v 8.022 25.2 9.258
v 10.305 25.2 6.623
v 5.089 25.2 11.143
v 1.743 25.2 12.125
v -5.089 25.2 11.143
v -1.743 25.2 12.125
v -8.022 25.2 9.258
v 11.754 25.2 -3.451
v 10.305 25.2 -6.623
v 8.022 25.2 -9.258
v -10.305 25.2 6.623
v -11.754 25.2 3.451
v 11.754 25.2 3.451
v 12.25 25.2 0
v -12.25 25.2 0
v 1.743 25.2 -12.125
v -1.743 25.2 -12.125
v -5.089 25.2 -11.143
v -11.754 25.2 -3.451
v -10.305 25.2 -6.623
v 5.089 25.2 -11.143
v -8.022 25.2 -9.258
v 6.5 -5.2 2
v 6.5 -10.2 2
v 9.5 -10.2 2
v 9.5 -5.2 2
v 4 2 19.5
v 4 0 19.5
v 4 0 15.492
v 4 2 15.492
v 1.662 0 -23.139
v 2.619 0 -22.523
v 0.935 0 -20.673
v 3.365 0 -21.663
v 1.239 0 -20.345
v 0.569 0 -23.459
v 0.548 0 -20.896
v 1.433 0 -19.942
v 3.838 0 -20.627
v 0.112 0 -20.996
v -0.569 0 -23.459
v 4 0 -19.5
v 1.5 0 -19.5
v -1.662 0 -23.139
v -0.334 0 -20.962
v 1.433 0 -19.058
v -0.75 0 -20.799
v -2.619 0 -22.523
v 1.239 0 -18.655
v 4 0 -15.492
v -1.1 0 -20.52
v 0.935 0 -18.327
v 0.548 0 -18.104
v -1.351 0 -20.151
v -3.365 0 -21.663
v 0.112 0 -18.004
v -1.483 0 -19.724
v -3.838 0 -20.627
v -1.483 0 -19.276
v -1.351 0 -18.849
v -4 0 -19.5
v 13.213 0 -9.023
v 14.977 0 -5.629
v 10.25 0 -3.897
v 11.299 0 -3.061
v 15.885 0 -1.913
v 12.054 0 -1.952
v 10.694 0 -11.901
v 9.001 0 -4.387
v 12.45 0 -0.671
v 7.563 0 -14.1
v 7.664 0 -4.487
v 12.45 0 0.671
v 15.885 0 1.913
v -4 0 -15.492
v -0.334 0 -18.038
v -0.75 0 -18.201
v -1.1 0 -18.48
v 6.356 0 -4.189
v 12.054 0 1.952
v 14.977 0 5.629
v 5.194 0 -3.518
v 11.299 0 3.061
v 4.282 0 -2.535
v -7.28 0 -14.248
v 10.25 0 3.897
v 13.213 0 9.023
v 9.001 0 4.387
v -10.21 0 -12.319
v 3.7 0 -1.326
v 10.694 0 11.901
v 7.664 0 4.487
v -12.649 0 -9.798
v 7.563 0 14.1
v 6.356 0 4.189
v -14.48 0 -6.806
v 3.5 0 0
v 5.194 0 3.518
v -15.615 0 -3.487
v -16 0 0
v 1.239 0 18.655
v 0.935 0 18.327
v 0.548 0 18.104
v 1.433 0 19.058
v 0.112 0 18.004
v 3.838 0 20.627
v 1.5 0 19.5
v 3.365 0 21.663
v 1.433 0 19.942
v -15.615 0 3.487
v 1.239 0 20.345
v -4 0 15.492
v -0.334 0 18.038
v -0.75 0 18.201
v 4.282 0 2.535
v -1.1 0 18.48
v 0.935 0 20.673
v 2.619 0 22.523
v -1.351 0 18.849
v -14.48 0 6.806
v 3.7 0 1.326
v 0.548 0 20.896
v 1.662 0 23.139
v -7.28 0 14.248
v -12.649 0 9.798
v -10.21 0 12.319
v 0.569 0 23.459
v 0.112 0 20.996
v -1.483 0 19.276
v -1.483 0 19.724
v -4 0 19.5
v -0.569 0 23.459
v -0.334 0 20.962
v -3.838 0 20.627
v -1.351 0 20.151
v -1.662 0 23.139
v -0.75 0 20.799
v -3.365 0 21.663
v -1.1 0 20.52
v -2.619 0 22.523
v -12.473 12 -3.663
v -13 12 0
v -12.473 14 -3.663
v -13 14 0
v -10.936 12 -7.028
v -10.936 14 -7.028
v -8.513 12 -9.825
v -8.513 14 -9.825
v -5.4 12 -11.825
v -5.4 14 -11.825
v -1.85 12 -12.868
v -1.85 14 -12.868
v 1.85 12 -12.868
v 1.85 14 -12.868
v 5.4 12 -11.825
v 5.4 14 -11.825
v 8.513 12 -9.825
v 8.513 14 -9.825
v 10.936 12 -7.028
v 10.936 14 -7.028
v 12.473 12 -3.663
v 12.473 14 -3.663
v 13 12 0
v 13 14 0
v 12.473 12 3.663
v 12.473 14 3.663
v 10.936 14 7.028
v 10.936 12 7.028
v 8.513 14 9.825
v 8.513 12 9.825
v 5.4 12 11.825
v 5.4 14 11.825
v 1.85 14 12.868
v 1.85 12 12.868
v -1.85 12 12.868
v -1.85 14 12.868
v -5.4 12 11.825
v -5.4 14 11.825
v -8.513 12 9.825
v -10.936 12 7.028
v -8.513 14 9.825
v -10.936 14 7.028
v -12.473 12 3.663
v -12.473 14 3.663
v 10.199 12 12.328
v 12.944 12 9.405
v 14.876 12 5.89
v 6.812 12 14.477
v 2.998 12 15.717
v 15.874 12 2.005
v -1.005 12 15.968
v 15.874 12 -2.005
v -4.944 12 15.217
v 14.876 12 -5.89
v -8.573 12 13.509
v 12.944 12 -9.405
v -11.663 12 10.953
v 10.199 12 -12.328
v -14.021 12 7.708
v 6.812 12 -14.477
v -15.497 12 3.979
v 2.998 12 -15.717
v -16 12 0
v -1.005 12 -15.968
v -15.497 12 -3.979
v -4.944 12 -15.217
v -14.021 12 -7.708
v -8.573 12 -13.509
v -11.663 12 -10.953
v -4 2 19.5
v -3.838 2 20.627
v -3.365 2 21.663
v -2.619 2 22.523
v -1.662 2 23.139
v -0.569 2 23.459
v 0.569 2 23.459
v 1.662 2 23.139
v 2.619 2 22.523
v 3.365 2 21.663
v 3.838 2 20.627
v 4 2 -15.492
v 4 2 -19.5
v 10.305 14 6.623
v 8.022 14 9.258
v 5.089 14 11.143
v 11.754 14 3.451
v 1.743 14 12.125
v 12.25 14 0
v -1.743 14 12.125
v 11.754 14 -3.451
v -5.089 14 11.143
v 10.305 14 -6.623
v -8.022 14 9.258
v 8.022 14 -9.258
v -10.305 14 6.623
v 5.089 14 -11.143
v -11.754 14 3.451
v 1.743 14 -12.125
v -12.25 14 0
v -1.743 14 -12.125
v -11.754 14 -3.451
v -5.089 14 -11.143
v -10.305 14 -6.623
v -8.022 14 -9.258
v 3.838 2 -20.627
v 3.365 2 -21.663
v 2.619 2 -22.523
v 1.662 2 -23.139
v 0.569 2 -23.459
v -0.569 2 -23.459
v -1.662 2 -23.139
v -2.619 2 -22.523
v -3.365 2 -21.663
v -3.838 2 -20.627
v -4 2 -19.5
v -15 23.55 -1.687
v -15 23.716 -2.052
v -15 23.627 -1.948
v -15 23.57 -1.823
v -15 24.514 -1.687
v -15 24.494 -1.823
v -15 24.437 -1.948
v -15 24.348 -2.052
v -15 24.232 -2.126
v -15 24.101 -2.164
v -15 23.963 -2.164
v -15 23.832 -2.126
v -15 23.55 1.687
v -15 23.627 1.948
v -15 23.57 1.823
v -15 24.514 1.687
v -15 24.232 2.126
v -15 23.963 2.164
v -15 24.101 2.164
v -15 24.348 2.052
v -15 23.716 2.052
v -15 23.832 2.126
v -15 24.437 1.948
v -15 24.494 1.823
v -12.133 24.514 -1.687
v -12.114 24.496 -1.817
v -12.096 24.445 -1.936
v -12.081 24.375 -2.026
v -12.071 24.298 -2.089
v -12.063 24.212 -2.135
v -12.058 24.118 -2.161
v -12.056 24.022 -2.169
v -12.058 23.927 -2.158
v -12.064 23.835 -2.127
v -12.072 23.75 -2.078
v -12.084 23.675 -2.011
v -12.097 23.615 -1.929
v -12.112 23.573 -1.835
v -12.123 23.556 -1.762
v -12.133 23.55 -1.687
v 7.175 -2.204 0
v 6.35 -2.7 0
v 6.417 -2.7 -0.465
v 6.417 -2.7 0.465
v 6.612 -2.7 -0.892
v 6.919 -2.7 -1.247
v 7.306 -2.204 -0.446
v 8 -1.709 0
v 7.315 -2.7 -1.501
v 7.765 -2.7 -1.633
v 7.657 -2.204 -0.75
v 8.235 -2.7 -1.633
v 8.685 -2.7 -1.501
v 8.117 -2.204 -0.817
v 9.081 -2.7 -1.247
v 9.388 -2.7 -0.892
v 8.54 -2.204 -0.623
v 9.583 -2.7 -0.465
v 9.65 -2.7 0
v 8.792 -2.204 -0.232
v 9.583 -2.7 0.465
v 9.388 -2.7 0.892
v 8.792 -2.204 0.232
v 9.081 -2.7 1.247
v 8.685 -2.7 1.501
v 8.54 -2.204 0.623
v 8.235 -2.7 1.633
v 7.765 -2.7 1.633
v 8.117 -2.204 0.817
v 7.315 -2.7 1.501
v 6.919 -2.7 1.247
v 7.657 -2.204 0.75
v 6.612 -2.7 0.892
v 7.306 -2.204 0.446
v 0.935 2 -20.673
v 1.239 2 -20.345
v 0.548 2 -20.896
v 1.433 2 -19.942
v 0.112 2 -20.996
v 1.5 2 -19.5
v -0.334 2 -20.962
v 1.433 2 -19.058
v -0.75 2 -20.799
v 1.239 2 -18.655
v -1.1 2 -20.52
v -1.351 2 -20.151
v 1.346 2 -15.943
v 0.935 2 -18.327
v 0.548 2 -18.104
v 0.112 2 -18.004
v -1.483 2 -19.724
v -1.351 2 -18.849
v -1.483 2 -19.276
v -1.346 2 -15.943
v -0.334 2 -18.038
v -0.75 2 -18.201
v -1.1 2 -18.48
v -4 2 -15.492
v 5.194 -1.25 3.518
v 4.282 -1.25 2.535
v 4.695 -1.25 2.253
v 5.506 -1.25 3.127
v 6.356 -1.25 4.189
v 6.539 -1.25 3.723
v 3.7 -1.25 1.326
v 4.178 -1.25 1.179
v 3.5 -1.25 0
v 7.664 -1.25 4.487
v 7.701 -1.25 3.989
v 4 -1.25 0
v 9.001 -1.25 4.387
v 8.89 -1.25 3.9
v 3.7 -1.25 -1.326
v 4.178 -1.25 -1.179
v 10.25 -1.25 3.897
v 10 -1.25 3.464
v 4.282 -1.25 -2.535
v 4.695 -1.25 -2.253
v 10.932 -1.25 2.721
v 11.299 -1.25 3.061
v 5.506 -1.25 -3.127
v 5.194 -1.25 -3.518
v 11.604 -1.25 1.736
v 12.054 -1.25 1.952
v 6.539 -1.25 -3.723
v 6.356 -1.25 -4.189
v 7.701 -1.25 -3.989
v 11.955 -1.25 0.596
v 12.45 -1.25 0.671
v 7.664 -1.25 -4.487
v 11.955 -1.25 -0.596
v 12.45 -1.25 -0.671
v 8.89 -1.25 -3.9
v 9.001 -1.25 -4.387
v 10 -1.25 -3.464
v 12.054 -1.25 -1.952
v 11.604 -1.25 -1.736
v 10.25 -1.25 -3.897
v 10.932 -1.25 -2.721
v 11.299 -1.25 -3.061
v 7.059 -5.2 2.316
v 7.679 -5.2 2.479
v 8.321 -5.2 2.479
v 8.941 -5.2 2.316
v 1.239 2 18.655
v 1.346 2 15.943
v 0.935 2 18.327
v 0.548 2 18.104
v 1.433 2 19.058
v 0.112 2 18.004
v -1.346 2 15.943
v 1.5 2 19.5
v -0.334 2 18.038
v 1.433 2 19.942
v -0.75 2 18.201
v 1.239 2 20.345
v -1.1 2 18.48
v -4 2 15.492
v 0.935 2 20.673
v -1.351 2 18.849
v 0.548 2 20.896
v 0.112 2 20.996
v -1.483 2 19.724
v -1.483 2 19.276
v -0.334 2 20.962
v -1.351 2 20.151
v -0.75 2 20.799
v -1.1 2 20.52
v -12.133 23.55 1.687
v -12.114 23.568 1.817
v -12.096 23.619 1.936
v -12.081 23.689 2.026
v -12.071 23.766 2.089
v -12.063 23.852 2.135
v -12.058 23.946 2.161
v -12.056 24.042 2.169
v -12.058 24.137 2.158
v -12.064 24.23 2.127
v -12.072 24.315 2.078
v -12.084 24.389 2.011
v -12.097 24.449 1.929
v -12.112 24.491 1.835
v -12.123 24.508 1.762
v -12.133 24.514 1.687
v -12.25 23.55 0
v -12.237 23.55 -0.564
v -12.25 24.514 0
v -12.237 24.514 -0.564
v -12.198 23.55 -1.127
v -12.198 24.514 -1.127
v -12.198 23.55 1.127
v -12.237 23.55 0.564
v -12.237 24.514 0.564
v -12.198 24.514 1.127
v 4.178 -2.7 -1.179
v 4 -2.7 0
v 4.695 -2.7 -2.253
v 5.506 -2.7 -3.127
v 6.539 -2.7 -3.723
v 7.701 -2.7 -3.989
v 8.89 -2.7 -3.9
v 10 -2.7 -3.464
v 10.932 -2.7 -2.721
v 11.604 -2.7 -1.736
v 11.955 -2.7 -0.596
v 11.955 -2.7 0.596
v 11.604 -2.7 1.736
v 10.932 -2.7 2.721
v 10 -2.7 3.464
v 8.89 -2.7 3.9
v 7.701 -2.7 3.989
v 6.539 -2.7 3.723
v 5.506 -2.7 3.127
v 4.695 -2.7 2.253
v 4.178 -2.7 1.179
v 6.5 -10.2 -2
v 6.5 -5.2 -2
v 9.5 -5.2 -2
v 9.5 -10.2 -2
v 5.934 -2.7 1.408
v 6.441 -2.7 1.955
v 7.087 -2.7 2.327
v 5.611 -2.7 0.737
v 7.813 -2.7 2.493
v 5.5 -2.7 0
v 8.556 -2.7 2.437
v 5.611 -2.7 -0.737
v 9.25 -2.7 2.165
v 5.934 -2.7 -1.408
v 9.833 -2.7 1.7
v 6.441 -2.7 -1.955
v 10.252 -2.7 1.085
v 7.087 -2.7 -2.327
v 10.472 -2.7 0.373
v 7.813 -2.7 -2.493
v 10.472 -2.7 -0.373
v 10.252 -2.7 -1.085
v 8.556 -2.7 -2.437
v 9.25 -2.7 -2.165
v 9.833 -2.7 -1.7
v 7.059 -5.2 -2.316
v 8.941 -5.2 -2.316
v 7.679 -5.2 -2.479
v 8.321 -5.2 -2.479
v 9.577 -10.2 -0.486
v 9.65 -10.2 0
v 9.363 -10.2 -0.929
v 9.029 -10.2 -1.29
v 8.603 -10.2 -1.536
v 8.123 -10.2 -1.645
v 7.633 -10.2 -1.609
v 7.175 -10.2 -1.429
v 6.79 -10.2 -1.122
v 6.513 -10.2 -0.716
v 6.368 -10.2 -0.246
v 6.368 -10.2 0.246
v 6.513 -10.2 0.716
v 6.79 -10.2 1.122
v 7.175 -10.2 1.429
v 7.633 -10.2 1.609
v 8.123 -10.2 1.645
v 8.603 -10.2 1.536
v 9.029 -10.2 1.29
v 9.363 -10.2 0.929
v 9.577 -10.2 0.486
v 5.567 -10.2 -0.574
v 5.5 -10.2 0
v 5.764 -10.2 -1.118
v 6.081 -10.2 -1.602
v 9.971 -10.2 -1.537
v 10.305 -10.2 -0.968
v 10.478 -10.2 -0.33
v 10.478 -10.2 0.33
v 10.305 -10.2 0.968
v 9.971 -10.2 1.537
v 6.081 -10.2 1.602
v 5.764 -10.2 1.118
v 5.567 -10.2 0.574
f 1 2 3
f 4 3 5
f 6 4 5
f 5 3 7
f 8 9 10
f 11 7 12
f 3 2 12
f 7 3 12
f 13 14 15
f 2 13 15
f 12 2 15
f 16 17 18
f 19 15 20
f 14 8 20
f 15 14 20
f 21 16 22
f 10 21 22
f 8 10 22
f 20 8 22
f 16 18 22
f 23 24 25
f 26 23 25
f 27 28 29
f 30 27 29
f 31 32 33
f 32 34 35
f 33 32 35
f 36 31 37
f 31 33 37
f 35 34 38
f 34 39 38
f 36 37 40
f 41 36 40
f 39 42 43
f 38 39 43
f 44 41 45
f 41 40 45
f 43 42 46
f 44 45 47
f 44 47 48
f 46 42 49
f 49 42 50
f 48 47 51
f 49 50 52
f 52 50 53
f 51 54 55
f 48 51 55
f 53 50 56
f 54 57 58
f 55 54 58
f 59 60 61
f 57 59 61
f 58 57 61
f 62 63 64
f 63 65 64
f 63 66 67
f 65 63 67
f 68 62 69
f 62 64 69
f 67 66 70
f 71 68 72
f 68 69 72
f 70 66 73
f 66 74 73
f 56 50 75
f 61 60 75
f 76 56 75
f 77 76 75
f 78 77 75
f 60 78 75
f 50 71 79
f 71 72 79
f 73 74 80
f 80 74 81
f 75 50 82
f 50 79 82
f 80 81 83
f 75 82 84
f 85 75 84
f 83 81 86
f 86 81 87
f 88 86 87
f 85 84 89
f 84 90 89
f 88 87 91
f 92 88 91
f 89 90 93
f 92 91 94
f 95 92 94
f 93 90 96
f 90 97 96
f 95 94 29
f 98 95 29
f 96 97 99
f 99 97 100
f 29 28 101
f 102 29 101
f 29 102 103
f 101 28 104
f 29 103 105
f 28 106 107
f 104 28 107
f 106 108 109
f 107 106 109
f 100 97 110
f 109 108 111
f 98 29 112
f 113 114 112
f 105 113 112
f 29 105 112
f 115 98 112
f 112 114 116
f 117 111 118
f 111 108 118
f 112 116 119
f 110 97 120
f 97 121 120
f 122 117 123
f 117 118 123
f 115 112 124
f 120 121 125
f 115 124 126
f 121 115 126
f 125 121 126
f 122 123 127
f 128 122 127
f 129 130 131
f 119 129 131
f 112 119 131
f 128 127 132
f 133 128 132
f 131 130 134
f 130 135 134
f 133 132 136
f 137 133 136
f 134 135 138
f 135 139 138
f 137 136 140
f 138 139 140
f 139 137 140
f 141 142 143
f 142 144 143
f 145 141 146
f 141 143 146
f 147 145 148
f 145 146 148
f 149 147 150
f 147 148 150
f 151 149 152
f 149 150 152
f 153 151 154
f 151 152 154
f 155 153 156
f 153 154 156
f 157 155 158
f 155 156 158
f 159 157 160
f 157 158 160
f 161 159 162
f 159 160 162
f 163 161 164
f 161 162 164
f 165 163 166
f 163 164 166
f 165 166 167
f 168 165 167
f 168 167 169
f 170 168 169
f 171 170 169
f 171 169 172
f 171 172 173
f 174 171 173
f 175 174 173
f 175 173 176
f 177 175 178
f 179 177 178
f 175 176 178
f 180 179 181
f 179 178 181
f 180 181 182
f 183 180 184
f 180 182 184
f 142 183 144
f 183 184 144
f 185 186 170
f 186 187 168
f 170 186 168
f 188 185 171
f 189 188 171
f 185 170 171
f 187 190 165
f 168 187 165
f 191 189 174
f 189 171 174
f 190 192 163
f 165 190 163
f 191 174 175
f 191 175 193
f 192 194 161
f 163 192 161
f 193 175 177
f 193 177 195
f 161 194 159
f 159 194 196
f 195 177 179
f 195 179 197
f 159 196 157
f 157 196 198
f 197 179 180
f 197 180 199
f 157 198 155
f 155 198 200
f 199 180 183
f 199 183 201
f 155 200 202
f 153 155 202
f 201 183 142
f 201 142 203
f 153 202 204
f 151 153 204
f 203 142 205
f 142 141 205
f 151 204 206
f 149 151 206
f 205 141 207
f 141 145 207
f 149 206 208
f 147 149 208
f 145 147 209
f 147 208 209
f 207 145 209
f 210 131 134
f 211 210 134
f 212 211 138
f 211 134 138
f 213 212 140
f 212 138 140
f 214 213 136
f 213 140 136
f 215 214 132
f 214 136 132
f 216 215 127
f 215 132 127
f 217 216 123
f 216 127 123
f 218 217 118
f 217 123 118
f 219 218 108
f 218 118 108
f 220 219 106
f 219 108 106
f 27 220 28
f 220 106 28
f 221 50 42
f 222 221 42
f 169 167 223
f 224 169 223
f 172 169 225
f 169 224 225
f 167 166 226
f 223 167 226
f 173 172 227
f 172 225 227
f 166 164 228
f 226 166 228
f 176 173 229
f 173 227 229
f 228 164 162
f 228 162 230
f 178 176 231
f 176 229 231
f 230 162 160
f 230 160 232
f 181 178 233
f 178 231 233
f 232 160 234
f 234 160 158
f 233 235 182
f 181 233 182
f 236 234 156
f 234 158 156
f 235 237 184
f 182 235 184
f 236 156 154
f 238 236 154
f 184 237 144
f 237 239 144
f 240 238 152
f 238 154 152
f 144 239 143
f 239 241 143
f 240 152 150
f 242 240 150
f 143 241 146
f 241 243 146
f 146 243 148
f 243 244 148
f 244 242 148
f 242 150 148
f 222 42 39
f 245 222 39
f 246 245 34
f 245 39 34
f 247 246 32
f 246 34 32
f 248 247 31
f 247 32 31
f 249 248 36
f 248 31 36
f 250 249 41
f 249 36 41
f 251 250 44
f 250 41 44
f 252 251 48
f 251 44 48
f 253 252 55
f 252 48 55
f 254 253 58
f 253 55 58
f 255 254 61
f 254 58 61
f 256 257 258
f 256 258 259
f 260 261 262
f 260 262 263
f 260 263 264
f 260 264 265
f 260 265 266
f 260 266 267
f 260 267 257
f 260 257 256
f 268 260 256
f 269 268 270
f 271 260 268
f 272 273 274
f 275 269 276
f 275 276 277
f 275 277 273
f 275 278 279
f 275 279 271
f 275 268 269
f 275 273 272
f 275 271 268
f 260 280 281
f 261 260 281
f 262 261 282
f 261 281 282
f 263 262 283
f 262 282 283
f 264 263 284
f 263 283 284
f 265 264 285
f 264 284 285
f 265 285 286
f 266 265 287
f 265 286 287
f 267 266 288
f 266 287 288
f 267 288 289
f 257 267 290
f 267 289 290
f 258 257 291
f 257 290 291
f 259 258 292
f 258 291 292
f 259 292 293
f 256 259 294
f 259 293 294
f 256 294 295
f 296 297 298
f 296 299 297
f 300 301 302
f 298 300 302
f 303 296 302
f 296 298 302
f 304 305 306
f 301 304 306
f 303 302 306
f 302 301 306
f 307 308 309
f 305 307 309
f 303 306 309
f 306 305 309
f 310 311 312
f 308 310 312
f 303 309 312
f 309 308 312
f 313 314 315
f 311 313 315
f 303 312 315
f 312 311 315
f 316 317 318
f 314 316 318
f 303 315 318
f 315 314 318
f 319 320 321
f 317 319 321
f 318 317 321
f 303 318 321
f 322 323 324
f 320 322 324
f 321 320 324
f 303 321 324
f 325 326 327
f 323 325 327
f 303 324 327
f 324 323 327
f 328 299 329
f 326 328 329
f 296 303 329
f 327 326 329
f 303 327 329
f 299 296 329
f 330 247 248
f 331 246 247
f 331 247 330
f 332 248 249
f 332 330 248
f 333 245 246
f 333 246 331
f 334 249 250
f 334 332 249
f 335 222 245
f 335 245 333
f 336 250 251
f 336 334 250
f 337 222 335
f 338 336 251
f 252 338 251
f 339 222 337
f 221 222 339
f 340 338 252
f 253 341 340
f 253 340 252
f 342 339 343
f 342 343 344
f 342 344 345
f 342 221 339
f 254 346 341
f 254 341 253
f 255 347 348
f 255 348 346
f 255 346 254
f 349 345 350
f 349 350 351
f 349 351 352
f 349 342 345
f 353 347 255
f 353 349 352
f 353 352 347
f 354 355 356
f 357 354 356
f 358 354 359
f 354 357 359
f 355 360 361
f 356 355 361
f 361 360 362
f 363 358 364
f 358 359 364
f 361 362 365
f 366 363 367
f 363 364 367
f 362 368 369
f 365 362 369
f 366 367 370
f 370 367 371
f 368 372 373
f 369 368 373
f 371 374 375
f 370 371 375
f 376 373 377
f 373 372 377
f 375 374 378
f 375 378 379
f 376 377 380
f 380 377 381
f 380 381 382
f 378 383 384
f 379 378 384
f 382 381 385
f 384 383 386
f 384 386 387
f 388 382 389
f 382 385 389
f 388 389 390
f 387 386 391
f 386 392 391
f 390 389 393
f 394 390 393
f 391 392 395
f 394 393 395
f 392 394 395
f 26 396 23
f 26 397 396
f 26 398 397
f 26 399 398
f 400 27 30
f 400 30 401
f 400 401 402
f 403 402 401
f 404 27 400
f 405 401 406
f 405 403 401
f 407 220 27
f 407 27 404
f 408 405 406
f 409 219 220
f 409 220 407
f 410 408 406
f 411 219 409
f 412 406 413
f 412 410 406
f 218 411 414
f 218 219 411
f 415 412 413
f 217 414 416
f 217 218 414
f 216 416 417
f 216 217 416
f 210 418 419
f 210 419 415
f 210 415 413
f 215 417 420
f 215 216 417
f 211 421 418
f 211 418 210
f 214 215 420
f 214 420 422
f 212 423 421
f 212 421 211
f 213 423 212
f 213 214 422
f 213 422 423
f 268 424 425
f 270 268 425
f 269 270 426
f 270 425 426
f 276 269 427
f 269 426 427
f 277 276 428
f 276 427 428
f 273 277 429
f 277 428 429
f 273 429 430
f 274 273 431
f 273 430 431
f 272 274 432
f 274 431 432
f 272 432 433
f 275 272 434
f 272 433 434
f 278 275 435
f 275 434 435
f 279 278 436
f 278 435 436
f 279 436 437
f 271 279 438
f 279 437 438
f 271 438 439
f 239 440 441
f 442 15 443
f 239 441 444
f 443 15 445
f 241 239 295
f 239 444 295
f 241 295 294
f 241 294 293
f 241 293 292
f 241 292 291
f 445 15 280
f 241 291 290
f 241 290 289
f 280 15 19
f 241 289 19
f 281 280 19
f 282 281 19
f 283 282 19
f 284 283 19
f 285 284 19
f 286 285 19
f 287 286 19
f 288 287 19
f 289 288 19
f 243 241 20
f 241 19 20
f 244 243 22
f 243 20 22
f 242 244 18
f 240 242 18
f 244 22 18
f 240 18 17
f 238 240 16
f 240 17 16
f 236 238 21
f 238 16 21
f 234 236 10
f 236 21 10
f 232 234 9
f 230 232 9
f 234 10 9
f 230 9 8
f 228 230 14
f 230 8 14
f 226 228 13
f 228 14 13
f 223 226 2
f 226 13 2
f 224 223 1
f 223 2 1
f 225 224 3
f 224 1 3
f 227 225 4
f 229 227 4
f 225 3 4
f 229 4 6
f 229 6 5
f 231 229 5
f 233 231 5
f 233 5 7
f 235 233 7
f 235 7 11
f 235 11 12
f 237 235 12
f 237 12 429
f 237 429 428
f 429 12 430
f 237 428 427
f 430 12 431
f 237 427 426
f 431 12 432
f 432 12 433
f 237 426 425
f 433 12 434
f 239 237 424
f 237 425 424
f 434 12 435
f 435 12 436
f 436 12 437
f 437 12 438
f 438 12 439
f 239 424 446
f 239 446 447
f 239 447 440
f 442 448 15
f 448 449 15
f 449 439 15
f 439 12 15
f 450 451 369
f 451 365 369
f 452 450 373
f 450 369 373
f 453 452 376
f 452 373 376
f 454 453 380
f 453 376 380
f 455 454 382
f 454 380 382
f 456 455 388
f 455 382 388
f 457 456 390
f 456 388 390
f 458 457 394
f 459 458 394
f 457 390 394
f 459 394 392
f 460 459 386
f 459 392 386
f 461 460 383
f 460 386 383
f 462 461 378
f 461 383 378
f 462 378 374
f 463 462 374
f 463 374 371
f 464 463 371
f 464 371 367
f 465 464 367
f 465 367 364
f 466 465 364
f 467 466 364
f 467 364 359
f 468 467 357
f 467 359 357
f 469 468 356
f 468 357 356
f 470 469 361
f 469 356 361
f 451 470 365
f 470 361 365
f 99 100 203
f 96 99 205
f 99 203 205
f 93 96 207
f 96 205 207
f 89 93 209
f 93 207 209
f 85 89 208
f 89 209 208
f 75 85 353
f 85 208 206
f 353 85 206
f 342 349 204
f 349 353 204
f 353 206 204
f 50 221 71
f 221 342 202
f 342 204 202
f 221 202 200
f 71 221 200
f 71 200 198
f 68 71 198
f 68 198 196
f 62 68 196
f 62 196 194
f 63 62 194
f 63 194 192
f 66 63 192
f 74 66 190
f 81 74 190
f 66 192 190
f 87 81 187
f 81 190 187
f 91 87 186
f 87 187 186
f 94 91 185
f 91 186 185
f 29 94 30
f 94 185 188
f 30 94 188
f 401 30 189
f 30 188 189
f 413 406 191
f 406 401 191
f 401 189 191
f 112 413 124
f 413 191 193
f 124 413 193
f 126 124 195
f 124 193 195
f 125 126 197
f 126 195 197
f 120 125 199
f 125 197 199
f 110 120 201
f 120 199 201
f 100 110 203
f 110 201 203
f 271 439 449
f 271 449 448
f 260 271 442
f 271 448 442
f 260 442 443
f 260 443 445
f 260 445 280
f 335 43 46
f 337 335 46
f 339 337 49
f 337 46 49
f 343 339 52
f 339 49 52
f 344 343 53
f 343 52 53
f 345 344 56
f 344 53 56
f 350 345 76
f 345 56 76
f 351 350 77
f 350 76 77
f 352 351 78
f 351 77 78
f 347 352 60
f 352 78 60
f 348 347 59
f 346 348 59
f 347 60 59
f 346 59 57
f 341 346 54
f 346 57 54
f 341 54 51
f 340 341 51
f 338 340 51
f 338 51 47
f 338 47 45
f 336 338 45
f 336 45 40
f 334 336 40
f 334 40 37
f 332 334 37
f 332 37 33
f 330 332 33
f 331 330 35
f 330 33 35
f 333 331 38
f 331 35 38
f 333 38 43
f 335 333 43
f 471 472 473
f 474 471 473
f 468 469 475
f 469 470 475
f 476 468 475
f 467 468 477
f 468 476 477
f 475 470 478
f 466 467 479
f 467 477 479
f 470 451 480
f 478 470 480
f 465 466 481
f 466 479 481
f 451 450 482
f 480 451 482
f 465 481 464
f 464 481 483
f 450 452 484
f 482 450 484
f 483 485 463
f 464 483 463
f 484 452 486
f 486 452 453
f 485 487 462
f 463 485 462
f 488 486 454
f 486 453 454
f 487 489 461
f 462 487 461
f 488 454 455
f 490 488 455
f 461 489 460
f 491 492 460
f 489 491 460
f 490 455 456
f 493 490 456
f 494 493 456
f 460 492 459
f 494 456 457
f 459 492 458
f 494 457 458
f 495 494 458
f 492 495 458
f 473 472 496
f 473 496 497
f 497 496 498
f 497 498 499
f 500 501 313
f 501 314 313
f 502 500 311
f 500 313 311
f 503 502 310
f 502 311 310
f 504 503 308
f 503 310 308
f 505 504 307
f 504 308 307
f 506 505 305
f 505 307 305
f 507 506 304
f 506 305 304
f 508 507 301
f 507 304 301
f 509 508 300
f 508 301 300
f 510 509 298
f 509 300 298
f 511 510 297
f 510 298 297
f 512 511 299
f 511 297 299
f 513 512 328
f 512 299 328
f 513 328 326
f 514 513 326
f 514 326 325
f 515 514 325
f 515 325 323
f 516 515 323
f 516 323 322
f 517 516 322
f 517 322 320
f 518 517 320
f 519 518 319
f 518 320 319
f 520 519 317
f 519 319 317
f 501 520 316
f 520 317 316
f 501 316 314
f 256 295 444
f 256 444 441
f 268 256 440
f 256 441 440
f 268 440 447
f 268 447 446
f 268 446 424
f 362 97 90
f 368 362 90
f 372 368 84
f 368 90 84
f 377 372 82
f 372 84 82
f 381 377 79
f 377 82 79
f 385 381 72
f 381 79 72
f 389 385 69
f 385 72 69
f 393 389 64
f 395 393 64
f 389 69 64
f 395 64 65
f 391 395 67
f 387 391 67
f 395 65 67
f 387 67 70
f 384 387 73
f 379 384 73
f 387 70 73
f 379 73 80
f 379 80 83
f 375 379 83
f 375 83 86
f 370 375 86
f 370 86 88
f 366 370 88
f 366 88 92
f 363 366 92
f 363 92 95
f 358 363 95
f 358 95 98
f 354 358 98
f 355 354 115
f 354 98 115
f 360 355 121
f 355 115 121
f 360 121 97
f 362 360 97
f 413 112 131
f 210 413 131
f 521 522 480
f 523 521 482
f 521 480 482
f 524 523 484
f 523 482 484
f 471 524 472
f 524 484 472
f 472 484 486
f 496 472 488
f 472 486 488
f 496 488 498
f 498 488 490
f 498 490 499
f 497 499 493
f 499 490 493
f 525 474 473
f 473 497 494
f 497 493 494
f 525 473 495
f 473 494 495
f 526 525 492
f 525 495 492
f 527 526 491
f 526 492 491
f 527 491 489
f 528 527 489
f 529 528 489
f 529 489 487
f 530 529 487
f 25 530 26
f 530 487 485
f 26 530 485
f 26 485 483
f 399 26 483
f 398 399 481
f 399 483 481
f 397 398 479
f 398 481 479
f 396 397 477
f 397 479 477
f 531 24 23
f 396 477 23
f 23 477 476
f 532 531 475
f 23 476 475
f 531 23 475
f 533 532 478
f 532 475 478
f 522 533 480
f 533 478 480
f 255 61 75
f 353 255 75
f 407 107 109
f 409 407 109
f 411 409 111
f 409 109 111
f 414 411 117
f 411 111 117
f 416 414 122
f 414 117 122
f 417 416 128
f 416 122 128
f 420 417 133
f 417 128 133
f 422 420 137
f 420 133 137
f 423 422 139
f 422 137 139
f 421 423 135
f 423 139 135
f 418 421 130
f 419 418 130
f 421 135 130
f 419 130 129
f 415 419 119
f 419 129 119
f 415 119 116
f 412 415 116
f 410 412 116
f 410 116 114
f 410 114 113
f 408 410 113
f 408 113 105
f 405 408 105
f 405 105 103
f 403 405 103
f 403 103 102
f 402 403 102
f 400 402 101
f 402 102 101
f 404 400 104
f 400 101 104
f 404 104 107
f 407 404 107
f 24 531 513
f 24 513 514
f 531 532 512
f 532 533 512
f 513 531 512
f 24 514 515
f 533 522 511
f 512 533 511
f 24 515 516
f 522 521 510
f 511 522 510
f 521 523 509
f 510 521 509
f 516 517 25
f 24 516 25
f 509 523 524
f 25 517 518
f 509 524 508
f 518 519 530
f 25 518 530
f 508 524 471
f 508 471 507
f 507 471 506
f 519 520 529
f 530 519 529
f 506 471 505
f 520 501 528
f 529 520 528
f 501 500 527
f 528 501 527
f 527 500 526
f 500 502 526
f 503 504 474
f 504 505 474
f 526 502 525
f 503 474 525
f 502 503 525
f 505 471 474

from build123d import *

# Parameters (mm, degrees)
HOLE_WIZARD_M4_1_D     = 3.3
HOLE_WIZARD_M4_1_DEPTH = 7.5
HOLE_WIZARD_M4_1_TIP   = 0.991420021
CUT_EXTRUDE_START      = 10.2
SKETCH_5_W             = 10.320177725
SKETCH_5_H             = 3.570001837
SKETCH_5_W_2           = 11.817937116
SKETCH_5_H_2           = 2.503104736
CUT_EXTRUDE_1_DEPTH    = 5
SKETCH_6_R             = 1.5
EXTRUDE_1_DEPTH        = 2
EXTRUDE_2_DEPTH        = 15


with BuildPart() as part:
    # 草图1 → 旋转1 (revolve)
    with BuildSketch(Plane.XY):
        Polygon((0, 0), (-16, 0), (-16, 12), (-13, 12), (-13, 14), (-12.25, 14), (-12.25, 25.2), (0, 25.2), align=None)
    revolve(axis=Axis((0, 25.2, 0), (0, -1, 0)))

    # 草图2 → 旋转2 (revolve)
    with BuildSketch(Plane.XY):
        Polygon((8, -10.2), (5.5, -10.2), (5.5, -2.7), (4, -2.7), (4, -1.25), (3.5, -1.25), (3.5, 0), (8, 0), align=None)
    revolve(axis=Axis((8, 0, 0), (0, -1, 0)))

    # M4 螺纹孔1
    with Locations(Plane(origin=(0, -10.2, 0), x_dir=(-1, 0, 0), z_dir=(0, -1, 0))):
        with Locations((-8, 0)):
            Hole(HOLE_WIZARD_M4_1_D / 2, depth=HOLE_WIZARD_M4_1_DEPTH)
            with Locations((0, 0, -(HOLE_WIZARD_M4_1_DEPTH + HOLE_WIZARD_M4_1_TIP / 2))):  # 118° drill point
                Cone(0, HOLE_WIZARD_M4_1_D / 2, HOLE_WIZARD_M4_1_TIP, mode=Mode.SUBTRACT)

    # 草图5 → 切除-拉伸1 (cut)
    with BuildSketch(Plane.XZ.offset(CUT_EXTRUDE_START)):
        with Locations((7.585780696, 3.785000919)):
            Rectangle(SKETCH_5_W, SKETCH_5_H)
        with Locations((6.836901, -3.251552368)):
            Rectangle(SKETCH_5_W_2, SKETCH_5_H_2)
    extrude(amount=-CUT_EXTRUDE_1_DEPTH, mode=Mode.SUBTRACT)

    # 草图6 → 凸台-拉伸1 (add)
    with BuildSketch(Plane.XZ):
        with BuildLine():
            Line((4, 19.5), (4, -19.5))
            ThreePointArc((4, -19.5), (0, -23.5), (-4, -19.5))
            Line((-4, -19.5), (-4, 19.5))
            ThreePointArc((-4, 19.5), (0, 23.5), (4, 19.5))
        make_face()
        with Locations((0, -19.5)):
            Circle(SKETCH_6_R, mode=Mode.SUBTRACT)
        with Locations((0, 19.5)):
            Circle(SKETCH_6_R, mode=Mode.SUBTRACT)
    extrude(amount=-EXTRUDE_1_DEPTH)

    # 草图7 → 凸台-拉伸2 (add)
    with BuildSketch(Plane(origin=(0, 0, 0), x_dir=(0, 0, -1), z_dir=(1, 0, 0))):
        with BuildLine():
            Line((-1.687384392, 24.513955372), (1.687384392, 24.513955372))
            ThreePointArc((1.687384392, 24.513955372), (2.169302813, 24.032036951), (1.687384392, 23.550118529))
            Line((1.687384392, 23.550118529), (-1.687384392, 23.550118529))
            ThreePointArc((-1.687384392, 23.550118529), (-2.169302813, 24.032036951), (-1.687384392, 24.513955372))
        make_face()
    extrude(amount=-EXTRUDE_2_DEPTH)


solid = part.part
